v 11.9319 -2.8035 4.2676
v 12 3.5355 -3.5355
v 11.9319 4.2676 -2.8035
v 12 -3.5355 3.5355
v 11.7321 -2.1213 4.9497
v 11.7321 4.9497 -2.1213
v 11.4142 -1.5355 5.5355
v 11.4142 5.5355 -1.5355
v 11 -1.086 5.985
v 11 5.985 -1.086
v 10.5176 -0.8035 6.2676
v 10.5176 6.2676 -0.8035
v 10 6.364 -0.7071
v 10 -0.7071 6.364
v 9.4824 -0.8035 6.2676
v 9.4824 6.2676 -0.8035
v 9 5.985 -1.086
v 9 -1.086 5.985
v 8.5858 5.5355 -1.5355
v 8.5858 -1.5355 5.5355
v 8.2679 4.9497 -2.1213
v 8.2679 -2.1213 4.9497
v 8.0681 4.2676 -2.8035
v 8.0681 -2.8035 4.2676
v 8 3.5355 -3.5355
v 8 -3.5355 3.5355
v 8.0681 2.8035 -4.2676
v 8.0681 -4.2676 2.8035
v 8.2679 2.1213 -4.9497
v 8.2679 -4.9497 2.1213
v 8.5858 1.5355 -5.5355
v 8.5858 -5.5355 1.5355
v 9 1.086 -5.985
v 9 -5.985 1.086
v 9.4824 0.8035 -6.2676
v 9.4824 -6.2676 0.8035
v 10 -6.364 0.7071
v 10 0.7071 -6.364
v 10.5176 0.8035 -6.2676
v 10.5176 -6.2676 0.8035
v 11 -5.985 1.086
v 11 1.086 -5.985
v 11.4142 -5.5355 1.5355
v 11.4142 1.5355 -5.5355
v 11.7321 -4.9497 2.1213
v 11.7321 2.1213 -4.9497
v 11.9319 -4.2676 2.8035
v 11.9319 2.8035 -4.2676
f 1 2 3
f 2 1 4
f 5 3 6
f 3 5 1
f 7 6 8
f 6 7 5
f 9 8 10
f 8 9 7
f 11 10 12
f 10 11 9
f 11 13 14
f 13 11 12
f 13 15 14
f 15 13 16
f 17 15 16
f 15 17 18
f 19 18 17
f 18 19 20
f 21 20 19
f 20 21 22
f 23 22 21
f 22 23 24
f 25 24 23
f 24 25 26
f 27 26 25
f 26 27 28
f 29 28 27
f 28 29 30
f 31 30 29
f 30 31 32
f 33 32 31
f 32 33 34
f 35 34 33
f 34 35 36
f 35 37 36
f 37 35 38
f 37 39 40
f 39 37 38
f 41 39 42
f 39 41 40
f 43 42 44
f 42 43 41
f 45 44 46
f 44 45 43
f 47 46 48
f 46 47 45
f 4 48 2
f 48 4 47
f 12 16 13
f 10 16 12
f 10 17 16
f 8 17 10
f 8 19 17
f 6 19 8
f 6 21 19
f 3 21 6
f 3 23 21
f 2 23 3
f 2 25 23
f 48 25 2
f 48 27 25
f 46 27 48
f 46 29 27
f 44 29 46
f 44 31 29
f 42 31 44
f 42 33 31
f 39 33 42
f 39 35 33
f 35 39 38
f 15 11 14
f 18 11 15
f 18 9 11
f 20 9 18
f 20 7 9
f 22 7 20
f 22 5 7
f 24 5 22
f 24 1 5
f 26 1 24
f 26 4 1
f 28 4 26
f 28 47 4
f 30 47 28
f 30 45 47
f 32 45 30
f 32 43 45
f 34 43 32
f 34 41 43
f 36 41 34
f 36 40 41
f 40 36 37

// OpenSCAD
//cube([40,20,10], center = true);

$fn = 24; //Number segments
//$fn = 24 fast preview
//48 medium quality
//96 High quaility
//+128 Very smoth


translate([10,0,0]) //; breaks the connection between the geometric forme and the action
color("blue")
rotate([45,0,0])
scale([1,2,1]){
cylinder(h=10, r=2, center = true);
}
//sphere(10);
